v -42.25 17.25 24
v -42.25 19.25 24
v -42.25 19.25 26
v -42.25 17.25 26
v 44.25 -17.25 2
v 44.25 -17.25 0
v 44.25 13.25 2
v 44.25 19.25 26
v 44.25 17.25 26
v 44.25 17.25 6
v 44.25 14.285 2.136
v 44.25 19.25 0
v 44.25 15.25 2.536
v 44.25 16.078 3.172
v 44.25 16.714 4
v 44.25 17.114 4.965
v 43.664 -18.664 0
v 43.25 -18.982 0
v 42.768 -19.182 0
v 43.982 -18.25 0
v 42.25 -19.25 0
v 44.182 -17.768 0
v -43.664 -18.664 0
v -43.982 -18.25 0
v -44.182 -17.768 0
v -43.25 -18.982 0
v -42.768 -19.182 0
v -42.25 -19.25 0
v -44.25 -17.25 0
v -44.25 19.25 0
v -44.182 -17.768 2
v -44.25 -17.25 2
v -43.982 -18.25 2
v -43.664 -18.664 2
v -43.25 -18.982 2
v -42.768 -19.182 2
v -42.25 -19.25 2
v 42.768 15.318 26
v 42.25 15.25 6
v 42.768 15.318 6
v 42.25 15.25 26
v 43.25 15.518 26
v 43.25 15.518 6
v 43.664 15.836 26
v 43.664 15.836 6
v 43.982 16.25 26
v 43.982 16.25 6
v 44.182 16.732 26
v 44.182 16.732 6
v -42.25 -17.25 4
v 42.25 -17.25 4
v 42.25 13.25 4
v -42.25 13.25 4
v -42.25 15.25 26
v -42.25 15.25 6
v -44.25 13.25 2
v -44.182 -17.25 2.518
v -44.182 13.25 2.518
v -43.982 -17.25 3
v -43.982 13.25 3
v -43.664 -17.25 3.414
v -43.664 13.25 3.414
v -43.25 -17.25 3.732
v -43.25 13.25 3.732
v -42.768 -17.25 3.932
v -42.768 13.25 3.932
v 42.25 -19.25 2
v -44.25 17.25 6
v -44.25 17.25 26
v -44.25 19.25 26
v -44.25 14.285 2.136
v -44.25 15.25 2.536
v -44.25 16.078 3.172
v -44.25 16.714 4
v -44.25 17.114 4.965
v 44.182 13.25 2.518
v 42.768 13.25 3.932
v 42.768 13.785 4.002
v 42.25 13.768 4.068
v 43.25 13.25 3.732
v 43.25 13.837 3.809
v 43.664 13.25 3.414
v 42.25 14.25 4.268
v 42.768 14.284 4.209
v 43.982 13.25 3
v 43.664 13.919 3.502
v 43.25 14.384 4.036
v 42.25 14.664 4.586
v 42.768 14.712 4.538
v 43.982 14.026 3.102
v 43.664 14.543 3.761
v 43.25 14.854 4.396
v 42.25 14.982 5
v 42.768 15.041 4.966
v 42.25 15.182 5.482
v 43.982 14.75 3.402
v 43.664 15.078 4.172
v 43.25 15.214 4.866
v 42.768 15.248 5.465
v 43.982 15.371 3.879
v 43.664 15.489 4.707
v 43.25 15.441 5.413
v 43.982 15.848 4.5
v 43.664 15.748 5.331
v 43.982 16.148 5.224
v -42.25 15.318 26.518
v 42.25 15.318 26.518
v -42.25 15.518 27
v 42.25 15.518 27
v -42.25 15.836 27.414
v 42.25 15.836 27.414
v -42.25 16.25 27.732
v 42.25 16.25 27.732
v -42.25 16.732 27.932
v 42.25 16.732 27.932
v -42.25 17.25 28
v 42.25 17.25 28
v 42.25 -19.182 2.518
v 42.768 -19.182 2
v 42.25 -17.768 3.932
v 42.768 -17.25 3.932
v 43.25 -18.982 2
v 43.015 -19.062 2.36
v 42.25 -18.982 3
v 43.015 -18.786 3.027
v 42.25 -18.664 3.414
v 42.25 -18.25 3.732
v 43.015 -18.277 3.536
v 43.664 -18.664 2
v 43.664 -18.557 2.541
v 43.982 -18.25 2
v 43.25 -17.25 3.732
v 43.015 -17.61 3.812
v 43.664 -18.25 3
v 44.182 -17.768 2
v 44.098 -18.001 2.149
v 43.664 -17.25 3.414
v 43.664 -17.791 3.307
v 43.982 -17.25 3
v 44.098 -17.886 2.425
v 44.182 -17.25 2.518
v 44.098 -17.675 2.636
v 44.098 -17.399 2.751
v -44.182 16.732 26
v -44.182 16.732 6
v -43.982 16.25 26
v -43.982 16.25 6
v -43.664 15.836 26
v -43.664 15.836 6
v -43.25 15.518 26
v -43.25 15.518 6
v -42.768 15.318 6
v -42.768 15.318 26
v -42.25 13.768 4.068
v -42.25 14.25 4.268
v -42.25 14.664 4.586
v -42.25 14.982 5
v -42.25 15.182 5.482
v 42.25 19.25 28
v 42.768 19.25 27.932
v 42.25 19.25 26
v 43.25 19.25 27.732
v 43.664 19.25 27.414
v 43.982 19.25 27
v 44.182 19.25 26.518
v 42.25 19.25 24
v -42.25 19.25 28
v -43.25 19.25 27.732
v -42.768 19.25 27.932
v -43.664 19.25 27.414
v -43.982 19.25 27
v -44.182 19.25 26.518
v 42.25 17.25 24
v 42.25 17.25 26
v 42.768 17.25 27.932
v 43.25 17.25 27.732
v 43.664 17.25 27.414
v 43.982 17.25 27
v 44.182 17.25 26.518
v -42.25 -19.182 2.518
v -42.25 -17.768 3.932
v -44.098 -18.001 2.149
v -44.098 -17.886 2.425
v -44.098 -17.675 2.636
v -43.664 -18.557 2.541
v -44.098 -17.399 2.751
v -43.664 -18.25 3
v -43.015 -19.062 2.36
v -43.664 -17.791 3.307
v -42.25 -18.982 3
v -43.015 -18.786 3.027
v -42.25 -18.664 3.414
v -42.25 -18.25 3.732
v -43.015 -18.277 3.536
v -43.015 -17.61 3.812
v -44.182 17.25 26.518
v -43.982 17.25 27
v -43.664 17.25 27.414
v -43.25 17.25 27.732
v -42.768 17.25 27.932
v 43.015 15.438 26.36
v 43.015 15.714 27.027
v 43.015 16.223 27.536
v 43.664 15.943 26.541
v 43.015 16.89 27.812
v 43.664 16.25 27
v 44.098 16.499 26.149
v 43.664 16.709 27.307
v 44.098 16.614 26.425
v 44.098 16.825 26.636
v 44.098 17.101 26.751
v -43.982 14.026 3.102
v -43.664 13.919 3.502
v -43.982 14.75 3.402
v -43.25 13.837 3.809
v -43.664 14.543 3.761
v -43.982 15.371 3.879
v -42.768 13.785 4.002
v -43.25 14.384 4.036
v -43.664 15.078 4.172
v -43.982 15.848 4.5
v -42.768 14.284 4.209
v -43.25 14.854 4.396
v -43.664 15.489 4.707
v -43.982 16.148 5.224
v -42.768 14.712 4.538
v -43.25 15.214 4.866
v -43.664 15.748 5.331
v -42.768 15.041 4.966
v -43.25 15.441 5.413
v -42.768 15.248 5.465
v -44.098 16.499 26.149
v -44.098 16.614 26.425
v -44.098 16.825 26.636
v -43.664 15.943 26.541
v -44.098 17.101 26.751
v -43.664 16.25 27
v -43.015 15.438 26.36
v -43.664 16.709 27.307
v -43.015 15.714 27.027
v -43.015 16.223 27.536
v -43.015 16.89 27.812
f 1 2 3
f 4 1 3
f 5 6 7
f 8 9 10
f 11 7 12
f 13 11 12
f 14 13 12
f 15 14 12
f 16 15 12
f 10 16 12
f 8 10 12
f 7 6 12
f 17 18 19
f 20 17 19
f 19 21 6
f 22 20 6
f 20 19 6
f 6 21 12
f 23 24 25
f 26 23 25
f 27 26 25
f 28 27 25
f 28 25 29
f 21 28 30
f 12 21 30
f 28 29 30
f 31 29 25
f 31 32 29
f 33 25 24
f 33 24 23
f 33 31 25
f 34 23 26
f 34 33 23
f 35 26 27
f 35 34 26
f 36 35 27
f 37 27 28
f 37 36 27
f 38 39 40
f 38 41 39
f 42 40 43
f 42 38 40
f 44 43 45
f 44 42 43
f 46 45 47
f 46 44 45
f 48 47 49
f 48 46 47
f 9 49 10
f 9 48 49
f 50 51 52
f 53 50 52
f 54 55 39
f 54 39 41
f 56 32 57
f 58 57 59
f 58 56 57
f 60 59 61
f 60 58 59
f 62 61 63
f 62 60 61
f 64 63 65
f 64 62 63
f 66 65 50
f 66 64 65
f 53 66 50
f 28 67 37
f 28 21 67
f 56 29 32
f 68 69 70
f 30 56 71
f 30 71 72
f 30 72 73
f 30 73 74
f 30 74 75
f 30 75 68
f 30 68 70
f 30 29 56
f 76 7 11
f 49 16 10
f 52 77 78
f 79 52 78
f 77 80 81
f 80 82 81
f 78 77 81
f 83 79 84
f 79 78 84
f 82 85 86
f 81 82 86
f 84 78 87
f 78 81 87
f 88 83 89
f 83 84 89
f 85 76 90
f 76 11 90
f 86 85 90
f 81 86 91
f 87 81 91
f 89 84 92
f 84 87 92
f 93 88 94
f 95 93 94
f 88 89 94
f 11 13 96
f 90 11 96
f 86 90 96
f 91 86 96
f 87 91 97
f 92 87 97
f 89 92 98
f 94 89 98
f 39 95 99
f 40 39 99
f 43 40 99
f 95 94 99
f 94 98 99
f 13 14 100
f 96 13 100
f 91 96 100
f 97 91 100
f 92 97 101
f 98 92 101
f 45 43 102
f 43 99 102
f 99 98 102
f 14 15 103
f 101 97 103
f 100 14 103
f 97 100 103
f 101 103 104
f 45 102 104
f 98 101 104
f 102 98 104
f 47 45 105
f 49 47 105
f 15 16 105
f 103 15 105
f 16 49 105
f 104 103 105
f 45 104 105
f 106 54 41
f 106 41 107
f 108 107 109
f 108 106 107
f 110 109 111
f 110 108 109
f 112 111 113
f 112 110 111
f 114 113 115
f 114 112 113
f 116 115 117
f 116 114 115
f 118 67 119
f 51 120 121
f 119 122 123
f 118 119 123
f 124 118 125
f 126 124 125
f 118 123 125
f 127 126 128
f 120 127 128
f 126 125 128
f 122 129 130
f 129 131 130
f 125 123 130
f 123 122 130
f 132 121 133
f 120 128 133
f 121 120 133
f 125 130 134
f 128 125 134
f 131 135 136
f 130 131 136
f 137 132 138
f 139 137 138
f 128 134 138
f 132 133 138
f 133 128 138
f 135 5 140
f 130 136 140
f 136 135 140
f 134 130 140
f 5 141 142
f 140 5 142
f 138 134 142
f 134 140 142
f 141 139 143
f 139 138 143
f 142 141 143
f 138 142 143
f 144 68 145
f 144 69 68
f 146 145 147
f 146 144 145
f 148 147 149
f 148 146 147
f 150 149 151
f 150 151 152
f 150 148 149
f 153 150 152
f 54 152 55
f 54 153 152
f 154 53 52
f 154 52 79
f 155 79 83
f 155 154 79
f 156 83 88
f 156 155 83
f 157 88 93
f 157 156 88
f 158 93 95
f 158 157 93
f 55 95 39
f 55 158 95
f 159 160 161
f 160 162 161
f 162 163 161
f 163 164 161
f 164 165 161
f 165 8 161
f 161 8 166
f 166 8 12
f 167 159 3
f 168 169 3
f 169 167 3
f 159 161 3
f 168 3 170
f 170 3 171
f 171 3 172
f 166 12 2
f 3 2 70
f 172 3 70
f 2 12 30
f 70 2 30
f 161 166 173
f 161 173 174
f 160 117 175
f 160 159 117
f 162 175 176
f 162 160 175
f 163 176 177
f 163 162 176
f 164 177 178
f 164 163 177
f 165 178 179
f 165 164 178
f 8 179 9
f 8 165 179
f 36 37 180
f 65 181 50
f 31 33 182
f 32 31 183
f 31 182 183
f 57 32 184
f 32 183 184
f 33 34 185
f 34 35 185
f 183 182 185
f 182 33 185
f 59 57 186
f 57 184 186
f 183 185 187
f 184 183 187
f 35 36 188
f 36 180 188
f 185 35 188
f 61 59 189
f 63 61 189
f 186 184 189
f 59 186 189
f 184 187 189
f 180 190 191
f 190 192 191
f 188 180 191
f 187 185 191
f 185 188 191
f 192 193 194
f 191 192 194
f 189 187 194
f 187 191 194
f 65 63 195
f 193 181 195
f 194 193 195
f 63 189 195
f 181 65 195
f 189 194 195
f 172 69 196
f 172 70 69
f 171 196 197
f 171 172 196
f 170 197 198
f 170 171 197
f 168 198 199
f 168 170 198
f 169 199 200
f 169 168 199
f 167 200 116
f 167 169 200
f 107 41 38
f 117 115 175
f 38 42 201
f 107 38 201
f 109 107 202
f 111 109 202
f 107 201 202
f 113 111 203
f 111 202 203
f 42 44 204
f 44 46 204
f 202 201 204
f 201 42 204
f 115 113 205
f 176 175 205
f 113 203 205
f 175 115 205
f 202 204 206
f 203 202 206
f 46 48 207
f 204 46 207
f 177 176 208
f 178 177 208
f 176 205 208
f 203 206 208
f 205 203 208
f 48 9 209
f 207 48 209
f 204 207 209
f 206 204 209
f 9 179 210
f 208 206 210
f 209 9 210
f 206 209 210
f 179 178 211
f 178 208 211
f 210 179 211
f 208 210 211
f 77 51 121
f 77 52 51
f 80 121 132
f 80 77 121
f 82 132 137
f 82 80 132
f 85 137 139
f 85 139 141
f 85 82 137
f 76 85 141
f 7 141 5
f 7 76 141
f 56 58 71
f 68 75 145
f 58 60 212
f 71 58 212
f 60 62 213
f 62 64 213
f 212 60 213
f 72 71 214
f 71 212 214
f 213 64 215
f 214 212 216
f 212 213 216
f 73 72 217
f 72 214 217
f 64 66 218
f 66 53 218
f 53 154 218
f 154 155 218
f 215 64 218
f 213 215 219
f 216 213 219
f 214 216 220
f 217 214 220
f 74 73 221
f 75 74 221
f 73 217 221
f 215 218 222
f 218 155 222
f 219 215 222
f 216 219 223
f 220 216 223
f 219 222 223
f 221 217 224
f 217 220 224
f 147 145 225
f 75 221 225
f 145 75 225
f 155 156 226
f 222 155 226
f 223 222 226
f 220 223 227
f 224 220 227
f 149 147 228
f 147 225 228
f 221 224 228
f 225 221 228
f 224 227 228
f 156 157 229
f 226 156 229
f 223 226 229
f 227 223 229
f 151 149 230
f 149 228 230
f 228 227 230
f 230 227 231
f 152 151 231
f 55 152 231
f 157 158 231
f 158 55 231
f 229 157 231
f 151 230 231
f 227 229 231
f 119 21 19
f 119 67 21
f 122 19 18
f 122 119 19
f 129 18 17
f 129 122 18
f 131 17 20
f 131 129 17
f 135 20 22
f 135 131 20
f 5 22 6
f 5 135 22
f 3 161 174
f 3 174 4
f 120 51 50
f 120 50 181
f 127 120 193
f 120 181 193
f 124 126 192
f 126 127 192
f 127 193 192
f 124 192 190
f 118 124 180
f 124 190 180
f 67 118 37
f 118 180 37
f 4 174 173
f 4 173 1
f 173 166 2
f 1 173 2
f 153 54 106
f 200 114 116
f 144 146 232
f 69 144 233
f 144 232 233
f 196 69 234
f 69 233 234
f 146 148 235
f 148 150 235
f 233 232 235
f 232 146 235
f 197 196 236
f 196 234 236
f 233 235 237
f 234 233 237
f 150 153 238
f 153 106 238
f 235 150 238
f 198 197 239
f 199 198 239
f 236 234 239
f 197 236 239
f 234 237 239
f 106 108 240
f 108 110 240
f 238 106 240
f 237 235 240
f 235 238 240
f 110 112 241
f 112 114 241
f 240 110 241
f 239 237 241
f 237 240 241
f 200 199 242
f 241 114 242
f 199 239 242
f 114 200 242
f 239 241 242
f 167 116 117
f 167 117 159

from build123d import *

# Parameters (mm, degrees)
SKETCH1_W           = 38.5
SKETCH1_H           = 88.5
BOSS_EXTRUDE1_DEPTH = 28
SKETCH2_W           = 34.5
SKETCH2_H           = 24
CUT_EXTRUDE1_DEPTH  = 88.5
FILLET1_R           = 2
FILLET2_R           = 2
FILLET3_R           = 2
FILLET4_R           = 2
FILLET5_R           = 2
SKETCH3_W           = 84.5
SKETCH3_H           = 2
CUT_EXTRUDE2_DEPTH  = 2


with BuildPart() as part:
    # Sketch1 → Boss-Extrude1 (new body)
    with BuildSketch(Plane(origin=(0, 0, 0), x_dir=(0, 1, 0), z_dir=(0, 0, 1))):
        Rectangle(SKETCH1_W, SKETCH1_H)
    extrude(amount=BOSS_EXTRUDE1_DEPTH)

    # Sketch2 → Cut-Extrude1 (cut)
    with BuildSketch(Plane.YZ.offset(44.25)):
        with Locations((-2, 16)):
            Rectangle(SKETCH2_W, SKETCH2_H)
    extrude(amount=-CUT_EXTRUDE1_DEPTH, mode=Mode.SUBTRACT)

    # Fillet1
    fillet1_edges = [part.edges().sort_by_distance(p)[0] for p in [
        (0, 15.25, 4),
    ]]
    fillet(fillet1_edges, radius=FILLET1_R)

    # Fillet2
    fillet2_edges = [part.edges().sort_by_distance(p)[0] for p in [
        (0, 15.25, 28),
    ]]
    fillet(fillet2_edges, radius=FILLET2_R)

    # Fillet3
    fillet3_edges = [part.edges().sort_by_distance(p)[0] for p in [
        (0, -19.25, 4),
    ]]
    fillet(fillet3_edges, radius=FILLET3_R)

    # Fillet4
    fillet4_edges = [part.edges().sort_by_distance(p)[0] for p in [
        (44.25, 15.25, 16),
        (44.25, 14.664213562, 4.585786438),
        (44.25, 18.25, 28),
        (44.25, 15.835786438, 27.414213562),
        (44.25, -2, 4),
        (44.25, -19.25, 1),
        (44.25, -18.664213562, 3.414213562),
    ]]
    fillet(fillet4_edges, radius=FILLET4_R)

    # Fillet5
    fillet5_edges = [part.edges().sort_by_distance(p)[0] for p in [
        (-44.25, 15.25, 16),
        (-44.25, 14.664213562, 4.585786438),
        (-44.25, 15.835786438, 27.414213562),
        (-44.25, -2, 4),
        (-44.25, -19.25, 1),
        (-44.25, -18.664213562, 3.414213562),
        (-44.25, 18.25, 28),
    ]]
    fillet(fillet5_edges, radius=FILLET5_R)

    # Sketch3 → Cut-Extrude2 (cut)
    with BuildSketch(Plane(origin=(0, 19.25, 0), x_dir=(-1, 0, 0), z_dir=(0, 1, 0))):
        with Locations((0, 25)):
            Rectangle(SKETCH3_W, SKETCH3_H)
    extrude(amount=-CUT_EXTRUDE2_DEPTH, mode=Mode.SUBTRACT)


solid = part.part
